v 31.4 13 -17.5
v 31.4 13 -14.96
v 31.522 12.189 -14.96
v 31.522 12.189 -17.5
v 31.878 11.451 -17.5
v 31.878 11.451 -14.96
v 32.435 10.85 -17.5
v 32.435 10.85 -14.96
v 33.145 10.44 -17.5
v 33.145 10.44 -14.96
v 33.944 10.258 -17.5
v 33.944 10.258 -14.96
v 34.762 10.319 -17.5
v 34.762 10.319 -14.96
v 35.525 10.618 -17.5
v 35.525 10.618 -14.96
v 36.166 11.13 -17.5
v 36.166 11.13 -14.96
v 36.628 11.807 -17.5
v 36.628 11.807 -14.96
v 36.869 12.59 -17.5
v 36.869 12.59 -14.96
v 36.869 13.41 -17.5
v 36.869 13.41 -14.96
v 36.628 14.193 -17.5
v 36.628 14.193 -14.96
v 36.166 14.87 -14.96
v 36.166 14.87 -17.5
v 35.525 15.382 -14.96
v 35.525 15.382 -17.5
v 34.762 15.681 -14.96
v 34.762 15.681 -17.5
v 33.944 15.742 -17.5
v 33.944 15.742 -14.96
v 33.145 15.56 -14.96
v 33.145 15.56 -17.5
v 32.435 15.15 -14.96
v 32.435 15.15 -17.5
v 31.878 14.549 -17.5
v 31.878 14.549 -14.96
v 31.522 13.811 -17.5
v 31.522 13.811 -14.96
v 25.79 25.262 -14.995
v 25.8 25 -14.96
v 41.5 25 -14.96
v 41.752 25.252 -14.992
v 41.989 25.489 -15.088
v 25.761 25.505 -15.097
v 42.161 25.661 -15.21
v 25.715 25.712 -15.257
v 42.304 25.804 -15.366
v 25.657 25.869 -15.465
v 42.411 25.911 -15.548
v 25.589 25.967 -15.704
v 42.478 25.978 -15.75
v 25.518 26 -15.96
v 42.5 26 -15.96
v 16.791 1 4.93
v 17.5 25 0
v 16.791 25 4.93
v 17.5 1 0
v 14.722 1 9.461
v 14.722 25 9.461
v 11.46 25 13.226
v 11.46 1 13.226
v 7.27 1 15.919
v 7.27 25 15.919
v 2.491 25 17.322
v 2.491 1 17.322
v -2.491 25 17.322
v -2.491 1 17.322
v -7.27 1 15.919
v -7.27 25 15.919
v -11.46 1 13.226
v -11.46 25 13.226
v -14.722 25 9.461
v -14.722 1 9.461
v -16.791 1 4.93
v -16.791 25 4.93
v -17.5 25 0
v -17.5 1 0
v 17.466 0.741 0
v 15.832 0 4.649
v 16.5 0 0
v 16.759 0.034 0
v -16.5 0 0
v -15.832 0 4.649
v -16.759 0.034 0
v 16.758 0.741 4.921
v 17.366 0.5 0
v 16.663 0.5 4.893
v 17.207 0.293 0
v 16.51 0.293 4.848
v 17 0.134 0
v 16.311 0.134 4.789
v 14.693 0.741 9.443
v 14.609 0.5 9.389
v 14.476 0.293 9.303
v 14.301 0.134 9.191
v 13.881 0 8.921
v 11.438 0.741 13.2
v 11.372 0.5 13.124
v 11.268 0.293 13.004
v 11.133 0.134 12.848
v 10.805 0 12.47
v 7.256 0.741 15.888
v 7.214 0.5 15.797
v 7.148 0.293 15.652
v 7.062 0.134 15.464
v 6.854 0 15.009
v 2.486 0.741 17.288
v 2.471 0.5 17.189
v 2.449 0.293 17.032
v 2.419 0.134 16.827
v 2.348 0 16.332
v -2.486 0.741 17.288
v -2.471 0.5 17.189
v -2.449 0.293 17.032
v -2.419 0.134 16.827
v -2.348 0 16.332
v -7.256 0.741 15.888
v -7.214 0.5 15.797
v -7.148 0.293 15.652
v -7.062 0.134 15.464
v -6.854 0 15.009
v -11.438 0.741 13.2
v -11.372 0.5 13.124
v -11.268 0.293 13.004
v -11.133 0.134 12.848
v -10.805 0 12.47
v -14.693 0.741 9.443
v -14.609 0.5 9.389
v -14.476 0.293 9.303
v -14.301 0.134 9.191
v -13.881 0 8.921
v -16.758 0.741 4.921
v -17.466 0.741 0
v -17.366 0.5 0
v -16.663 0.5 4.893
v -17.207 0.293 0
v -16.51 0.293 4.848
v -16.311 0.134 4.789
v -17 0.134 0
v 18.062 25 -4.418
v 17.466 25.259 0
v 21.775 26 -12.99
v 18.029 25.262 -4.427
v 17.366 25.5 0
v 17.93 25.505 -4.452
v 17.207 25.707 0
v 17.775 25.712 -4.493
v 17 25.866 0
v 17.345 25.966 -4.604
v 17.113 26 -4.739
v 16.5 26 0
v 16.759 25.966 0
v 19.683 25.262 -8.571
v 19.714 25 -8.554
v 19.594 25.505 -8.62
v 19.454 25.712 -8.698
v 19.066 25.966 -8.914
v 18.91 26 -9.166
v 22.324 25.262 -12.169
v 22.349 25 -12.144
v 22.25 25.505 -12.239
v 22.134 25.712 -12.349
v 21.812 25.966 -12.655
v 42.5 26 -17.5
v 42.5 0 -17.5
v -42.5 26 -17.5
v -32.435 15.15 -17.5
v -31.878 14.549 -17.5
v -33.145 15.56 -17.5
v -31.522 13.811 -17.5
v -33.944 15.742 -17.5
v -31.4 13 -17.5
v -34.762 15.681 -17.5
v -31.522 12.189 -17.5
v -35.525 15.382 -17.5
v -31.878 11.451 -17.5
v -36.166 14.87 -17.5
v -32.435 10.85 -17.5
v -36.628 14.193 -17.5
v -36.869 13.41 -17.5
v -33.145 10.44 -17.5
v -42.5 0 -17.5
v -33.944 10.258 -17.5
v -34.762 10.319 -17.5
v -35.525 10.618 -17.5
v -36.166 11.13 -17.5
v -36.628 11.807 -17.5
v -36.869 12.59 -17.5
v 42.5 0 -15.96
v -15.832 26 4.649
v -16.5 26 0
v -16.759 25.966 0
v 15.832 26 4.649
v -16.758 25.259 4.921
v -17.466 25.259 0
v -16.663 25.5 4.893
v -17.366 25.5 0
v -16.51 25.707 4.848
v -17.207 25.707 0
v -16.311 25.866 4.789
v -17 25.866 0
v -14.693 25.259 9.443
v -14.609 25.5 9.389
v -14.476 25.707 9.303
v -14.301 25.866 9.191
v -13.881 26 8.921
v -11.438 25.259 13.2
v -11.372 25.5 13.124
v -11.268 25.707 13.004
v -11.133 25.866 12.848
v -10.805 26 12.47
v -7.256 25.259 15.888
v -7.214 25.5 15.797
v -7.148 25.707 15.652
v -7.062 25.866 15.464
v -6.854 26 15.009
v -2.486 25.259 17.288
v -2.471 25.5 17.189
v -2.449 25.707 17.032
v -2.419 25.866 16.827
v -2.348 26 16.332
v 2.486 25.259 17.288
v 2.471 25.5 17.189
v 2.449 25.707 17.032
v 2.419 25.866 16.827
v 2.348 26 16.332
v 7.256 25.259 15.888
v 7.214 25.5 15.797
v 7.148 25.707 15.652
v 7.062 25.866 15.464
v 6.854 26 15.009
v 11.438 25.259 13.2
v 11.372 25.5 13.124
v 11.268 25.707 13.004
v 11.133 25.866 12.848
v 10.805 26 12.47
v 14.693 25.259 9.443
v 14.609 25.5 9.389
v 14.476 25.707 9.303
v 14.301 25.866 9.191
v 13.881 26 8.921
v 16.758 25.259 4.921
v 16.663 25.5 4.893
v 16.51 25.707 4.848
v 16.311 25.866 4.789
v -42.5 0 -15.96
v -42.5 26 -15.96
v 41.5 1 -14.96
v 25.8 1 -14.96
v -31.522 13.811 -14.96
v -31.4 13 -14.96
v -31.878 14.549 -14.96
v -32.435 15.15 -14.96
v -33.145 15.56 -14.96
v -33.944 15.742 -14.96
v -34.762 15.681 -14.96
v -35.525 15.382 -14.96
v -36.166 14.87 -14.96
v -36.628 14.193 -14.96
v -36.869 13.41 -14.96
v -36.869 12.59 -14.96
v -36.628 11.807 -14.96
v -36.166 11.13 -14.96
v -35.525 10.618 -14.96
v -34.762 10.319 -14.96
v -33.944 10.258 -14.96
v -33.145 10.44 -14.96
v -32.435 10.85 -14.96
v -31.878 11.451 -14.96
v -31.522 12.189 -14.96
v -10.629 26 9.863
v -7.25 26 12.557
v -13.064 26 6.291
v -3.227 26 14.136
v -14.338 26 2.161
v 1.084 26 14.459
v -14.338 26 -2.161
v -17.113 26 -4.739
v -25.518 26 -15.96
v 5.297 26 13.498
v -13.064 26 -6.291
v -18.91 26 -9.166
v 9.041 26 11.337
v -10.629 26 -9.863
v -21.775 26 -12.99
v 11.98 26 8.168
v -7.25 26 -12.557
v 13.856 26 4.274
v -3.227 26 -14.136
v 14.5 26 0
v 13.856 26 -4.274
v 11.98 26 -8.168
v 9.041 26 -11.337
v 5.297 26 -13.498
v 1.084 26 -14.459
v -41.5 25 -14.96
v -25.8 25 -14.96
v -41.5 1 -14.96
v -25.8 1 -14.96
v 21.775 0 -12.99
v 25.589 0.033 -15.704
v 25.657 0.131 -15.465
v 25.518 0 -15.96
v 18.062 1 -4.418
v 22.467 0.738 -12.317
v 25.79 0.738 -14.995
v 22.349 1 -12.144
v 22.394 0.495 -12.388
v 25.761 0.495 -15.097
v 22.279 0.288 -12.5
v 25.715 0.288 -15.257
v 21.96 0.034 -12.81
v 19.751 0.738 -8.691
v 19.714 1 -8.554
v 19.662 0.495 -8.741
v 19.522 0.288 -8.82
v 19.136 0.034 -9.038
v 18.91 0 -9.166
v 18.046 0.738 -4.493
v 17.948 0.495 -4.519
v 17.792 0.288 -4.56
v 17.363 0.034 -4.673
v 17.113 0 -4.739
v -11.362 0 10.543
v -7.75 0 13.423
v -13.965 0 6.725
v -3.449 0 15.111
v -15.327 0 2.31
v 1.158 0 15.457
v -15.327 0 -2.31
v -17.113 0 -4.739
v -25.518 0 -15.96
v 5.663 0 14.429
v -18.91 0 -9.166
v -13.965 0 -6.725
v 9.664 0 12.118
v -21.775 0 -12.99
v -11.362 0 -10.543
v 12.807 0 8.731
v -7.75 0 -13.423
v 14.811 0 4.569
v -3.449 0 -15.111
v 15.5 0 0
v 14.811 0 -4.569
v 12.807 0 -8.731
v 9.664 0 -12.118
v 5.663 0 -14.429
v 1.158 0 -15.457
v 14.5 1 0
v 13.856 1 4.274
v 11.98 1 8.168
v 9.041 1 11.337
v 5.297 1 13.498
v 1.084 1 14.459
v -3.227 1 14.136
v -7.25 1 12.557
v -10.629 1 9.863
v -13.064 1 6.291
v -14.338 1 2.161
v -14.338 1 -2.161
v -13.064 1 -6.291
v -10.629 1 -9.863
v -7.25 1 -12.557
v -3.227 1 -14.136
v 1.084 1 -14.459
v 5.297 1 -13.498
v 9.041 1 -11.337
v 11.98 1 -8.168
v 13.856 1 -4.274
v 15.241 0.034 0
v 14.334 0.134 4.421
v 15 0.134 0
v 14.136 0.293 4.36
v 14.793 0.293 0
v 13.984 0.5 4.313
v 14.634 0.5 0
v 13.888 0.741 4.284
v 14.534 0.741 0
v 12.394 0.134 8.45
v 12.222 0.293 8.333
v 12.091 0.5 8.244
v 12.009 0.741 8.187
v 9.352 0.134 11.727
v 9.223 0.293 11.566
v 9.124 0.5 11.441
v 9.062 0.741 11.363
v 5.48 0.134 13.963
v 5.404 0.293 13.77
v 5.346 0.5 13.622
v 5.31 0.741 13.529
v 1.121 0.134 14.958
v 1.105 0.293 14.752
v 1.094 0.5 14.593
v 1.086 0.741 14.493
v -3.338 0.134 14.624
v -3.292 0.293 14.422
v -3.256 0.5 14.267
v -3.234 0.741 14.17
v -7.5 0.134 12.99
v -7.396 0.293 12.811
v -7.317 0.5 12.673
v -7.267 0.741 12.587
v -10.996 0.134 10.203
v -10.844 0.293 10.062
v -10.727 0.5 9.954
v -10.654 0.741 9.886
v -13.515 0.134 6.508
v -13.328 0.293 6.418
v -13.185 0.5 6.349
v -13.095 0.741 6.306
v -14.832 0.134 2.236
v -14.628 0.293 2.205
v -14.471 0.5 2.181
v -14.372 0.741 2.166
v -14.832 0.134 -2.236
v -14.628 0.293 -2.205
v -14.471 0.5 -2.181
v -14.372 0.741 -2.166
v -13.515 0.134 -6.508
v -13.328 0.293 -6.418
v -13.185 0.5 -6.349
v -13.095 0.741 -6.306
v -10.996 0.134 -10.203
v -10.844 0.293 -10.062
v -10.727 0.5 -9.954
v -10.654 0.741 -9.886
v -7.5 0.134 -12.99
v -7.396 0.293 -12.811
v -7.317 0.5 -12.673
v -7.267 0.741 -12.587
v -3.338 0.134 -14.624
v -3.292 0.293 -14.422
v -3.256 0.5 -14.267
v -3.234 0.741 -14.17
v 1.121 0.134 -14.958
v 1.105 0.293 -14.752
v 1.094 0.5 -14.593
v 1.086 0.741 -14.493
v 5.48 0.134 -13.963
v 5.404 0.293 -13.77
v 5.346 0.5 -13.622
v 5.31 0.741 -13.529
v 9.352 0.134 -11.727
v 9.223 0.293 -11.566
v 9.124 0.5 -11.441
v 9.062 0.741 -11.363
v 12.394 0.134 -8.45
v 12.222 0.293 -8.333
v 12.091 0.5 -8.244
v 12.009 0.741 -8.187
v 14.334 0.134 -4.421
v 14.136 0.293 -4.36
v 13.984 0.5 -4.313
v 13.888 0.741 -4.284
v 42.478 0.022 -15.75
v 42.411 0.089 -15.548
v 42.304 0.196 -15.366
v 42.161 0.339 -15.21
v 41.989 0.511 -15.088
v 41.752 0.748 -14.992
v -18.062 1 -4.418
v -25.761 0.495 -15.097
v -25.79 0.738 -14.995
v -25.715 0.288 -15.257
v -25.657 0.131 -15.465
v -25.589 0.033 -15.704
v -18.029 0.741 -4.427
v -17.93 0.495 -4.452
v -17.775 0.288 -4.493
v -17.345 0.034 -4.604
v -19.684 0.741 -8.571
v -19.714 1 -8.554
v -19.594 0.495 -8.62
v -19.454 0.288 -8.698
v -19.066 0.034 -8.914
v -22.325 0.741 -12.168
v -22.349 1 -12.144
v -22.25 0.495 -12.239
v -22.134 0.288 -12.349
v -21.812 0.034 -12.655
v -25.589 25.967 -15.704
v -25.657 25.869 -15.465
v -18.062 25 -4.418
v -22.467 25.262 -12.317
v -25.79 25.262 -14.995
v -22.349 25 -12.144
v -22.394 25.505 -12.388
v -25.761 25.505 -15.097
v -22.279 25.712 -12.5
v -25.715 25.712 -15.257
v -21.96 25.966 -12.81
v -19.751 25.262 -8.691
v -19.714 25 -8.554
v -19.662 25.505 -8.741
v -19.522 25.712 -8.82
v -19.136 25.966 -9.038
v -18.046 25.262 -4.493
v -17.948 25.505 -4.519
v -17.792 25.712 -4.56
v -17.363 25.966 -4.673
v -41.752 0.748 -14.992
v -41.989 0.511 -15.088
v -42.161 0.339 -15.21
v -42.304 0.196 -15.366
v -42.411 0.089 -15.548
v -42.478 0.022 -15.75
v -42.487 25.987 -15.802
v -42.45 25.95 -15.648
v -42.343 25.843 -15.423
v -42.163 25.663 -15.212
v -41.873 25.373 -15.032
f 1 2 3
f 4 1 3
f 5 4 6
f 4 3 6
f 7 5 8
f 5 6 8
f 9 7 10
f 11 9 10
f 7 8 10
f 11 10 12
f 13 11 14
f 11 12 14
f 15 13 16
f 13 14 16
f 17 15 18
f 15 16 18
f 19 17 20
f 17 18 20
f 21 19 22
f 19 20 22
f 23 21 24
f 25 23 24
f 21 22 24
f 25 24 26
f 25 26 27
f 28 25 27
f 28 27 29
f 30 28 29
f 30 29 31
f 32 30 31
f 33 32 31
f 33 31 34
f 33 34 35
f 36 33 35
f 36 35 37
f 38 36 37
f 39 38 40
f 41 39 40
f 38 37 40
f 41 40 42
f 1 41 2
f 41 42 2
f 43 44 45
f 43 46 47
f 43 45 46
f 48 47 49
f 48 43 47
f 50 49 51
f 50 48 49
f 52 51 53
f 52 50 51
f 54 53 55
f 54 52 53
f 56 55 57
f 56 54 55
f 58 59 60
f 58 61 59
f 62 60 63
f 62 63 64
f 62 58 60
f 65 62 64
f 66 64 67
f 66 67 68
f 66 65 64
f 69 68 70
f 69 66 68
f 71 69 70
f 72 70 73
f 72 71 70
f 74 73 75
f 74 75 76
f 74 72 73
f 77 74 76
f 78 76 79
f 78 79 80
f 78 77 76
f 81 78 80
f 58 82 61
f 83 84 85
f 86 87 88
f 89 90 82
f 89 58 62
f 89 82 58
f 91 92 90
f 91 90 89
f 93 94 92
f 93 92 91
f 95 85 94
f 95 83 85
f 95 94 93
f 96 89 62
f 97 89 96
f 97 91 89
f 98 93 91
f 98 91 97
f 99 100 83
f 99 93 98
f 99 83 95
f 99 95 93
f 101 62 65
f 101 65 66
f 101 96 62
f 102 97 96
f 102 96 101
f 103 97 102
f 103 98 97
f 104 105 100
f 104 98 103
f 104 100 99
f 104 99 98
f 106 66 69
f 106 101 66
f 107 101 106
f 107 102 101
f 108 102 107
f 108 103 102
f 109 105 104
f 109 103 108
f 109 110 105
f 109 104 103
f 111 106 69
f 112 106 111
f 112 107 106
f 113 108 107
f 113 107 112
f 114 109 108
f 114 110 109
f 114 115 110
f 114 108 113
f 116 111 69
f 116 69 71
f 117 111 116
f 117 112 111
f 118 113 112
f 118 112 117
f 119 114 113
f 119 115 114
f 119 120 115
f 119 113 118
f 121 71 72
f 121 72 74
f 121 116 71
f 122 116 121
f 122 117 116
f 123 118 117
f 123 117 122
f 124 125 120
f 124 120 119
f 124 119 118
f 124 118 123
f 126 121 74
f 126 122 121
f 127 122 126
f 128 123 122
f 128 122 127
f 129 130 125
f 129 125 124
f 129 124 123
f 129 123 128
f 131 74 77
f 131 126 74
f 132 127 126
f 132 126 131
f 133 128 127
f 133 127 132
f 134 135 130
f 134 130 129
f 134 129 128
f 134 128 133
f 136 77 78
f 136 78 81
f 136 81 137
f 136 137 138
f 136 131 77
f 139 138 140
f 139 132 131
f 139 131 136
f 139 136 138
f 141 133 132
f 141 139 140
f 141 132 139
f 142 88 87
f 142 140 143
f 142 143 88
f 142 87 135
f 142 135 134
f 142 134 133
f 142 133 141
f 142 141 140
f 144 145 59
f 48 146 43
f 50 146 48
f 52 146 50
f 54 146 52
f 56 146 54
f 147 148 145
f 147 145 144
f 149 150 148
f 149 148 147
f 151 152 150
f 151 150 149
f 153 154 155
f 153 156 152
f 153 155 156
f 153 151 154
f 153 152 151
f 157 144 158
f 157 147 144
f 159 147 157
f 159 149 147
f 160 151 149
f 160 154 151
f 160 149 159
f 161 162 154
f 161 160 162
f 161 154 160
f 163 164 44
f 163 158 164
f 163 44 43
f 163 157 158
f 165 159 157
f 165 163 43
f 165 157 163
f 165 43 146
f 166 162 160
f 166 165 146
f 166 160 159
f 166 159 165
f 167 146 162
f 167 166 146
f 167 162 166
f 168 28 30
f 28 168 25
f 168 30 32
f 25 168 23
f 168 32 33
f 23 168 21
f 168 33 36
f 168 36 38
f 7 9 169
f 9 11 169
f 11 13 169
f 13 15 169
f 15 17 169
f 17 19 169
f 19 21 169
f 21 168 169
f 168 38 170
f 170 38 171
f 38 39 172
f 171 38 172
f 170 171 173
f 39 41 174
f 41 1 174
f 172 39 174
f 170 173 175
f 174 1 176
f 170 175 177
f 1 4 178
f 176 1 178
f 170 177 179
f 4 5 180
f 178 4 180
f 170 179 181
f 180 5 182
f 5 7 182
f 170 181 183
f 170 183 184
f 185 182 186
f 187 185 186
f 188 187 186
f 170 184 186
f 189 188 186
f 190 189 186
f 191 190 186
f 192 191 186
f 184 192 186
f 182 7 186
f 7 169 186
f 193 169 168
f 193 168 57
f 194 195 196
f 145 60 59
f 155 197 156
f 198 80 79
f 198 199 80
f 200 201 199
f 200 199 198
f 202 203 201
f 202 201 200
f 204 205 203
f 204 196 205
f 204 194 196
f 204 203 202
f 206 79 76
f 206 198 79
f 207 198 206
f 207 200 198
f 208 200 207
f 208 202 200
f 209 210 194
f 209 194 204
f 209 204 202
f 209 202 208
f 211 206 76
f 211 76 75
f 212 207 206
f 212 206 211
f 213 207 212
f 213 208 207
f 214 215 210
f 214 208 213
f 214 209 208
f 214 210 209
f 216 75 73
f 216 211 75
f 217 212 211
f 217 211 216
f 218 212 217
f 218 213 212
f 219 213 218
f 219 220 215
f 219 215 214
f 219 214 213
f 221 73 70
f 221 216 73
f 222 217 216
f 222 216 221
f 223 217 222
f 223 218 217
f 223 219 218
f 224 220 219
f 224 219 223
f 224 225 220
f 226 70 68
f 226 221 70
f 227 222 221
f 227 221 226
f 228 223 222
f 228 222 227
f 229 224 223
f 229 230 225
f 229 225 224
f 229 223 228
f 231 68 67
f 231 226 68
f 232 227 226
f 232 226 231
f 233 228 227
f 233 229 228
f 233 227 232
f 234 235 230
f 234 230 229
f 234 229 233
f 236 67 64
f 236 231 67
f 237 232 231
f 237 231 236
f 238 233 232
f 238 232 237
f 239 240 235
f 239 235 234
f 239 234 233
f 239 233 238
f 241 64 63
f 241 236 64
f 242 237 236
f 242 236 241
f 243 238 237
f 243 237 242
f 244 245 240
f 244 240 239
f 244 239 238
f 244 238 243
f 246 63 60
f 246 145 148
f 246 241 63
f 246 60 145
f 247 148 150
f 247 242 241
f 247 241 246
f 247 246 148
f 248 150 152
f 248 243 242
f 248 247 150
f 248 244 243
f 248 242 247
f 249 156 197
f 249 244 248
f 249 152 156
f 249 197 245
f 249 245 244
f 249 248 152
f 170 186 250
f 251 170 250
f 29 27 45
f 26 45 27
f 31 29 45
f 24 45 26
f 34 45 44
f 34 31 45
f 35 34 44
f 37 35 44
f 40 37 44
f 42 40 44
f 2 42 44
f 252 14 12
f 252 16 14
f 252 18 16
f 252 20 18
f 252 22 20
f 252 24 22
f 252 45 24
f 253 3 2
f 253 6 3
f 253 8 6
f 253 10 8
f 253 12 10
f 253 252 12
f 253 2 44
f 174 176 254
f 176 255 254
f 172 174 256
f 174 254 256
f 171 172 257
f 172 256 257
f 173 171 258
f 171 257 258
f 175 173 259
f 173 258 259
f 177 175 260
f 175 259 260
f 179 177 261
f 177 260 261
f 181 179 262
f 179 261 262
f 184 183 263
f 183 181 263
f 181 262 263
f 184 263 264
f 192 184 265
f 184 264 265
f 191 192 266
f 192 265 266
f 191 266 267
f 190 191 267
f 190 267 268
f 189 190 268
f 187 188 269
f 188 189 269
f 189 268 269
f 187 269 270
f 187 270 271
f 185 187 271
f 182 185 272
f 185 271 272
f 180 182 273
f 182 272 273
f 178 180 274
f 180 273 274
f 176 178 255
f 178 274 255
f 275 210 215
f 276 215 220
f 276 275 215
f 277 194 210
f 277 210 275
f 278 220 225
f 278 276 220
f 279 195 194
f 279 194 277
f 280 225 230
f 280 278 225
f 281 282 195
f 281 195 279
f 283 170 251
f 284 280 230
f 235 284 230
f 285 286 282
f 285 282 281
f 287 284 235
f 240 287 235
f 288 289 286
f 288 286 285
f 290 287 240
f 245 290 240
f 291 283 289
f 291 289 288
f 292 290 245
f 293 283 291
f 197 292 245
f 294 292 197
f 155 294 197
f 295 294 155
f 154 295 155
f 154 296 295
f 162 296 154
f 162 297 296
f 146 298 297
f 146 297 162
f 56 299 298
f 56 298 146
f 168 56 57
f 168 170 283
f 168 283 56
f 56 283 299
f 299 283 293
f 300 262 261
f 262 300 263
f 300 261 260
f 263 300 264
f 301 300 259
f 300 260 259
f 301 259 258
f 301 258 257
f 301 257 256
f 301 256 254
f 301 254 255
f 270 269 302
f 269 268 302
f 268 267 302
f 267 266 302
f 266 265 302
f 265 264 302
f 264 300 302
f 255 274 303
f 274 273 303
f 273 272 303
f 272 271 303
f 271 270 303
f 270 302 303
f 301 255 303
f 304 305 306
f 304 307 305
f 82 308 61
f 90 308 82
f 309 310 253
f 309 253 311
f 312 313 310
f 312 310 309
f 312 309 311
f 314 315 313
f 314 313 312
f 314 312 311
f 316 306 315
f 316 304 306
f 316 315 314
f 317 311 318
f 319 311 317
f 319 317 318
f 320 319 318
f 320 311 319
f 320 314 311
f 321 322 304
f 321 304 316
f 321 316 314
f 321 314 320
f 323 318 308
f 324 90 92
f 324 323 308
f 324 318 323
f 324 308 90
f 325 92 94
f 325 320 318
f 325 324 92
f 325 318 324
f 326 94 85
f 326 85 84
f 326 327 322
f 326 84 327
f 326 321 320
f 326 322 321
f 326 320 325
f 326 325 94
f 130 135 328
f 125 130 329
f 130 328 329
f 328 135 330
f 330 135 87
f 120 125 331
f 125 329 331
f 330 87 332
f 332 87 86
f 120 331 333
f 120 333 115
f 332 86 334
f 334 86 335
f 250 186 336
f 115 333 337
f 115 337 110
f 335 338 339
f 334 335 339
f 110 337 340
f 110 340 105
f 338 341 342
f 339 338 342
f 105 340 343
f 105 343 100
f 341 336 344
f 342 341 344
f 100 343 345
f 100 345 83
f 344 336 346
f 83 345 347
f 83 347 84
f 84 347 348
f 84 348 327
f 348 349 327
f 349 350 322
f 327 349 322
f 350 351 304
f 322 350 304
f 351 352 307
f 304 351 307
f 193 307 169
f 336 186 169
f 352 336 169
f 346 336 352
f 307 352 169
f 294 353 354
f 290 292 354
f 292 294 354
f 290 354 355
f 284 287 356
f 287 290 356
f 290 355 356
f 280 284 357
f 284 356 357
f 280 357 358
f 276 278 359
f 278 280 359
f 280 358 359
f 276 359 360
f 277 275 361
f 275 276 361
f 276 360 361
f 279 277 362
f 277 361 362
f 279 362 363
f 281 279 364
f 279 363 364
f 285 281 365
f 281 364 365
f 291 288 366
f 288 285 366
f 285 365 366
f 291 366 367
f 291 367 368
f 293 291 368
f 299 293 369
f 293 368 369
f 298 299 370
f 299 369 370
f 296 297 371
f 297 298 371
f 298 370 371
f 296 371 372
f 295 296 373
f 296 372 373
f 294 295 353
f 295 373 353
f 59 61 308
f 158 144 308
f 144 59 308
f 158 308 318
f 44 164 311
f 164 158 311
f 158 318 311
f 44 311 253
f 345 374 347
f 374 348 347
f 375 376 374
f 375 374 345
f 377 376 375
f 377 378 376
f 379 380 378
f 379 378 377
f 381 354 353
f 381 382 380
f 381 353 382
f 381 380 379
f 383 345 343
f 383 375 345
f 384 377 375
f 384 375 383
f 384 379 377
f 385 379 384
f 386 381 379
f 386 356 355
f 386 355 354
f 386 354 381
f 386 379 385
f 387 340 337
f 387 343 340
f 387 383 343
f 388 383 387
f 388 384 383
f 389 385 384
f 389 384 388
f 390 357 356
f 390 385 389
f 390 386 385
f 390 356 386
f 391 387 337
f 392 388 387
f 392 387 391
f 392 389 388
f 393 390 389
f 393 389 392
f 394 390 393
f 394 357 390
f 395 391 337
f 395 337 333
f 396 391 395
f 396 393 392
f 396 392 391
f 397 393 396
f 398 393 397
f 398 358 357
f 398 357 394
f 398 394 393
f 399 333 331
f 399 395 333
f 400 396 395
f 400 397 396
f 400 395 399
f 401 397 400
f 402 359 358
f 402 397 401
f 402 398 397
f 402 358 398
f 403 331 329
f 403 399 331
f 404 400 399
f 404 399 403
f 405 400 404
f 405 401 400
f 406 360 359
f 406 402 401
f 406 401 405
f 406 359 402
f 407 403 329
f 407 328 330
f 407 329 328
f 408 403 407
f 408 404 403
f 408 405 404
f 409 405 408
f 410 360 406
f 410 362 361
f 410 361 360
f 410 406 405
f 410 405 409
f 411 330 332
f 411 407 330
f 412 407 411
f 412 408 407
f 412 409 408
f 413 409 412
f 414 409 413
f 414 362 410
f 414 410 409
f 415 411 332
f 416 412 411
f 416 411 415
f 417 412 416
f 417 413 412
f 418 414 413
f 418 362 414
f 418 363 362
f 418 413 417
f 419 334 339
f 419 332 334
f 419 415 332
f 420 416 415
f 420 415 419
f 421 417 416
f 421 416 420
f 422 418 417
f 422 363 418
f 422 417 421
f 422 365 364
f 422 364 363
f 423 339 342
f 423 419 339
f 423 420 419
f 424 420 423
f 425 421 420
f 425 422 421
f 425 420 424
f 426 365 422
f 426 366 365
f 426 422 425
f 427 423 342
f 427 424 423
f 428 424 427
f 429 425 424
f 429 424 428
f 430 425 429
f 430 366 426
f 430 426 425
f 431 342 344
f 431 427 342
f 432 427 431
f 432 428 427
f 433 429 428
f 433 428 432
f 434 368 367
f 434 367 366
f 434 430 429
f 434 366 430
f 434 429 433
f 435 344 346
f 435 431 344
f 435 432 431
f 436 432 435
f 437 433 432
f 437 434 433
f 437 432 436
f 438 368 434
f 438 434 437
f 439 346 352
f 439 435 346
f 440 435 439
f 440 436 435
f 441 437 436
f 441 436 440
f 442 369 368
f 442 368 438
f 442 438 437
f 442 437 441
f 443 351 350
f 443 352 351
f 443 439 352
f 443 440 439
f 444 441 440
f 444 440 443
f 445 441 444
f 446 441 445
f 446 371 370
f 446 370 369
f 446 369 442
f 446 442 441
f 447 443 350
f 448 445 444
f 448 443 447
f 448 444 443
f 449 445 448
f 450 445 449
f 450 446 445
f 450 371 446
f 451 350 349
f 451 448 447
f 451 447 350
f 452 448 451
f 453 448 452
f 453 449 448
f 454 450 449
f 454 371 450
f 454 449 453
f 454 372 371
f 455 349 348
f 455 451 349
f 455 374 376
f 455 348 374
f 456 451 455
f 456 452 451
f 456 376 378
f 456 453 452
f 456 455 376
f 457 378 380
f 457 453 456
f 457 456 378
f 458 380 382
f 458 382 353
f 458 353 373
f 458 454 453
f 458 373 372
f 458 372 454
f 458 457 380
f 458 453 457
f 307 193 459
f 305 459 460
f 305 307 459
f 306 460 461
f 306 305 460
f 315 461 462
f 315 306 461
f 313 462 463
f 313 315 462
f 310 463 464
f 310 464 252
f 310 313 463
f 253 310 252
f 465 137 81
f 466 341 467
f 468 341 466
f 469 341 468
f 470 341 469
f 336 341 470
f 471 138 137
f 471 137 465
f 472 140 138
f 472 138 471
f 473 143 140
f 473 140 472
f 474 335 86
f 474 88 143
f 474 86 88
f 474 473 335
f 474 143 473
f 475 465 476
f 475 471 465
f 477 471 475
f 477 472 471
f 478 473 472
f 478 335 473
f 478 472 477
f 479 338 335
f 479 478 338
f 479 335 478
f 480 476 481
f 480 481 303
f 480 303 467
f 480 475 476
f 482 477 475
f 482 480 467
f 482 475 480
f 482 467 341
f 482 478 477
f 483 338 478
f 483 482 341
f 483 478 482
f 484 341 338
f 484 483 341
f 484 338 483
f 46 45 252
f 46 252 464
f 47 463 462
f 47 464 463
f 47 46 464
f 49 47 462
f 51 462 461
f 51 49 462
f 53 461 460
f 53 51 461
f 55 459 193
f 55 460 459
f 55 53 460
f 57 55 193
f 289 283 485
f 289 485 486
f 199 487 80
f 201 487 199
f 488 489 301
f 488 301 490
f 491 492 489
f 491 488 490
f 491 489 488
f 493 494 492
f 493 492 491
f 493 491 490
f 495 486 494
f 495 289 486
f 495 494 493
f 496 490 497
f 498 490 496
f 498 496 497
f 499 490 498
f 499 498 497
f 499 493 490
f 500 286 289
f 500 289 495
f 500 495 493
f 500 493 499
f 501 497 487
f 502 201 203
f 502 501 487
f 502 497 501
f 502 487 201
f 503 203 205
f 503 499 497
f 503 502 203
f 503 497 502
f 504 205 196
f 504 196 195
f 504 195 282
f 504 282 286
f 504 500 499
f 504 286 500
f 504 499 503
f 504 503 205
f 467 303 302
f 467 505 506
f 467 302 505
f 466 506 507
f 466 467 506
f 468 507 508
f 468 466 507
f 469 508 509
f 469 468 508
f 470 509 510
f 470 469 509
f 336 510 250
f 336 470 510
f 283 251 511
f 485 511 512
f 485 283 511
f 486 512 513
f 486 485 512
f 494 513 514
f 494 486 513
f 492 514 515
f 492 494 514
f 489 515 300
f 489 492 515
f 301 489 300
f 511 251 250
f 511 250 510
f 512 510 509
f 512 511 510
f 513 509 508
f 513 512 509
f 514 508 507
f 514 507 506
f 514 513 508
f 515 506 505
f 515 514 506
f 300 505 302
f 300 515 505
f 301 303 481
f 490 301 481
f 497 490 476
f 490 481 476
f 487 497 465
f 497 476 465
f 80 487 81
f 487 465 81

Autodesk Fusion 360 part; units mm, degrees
sketch "Sketch1" plane through (0, 0, 0) normal (0, 1, 0) x (1, 0, 0)
  circle A0 centre (0, 0) radius 14.5
  circle A1 centre (0, 0) radius 17.5
  line L0 (0, 17.5) -> (28.7095, 17.5) construction
  line L1 (17.5, 0) -> (17.5, 17.5) construction
  line L2 (17.5, 0) -> (17.5, 17.5)
  line L3 (0, 17.5) -> (17.5, 17.5)
  line L4 (17.5, 17.5) -> (42.5, 17.5)
  line L5 (42.5, 17.5) -> (42.5, 14.96)
  line L6 (42.5, 14.96) -> (17.5, 14.96)
  line L7 (17.5, 14.96) -> (17.5, 17.5)
  line L8 (17.5, 14.96) -> (18.9859, 14.96) construction
  line L9 (17.5, 14.96) -> (25.8, 14.96) construction
  arc A2 (25.8, 14.96) -> (17.5, 0) centre (35.132, 0) ccw
  line L10 (0, -17.5) -> (0, 17.5) construction
  line L11 (17.5, 0) -> (-17.5, 0) construction
  arc A3 (-17.5, 0) -> (-25.8, 14.96) centre (-35.132, 0) ccw
  line L12 (-17.5, 0) -> (-17.5, 17.5)
  line L13 (-17.5, 14.96) -> (-25.8, 14.96) construction
  line L14 (-42.5, 14.96) -> (-17.5, 14.96)
  line L15 (-42.5, 17.5) -> (-42.5, 14.96)
  line L16 (-17.5, 17.5) -> (-42.5, 17.5)
  line L17 (0, 17.5) -> (-17.5, 17.5)
  dimension "d5" = 29
  dimension "d6" = 35
  dimension "d7" = 25
  dimension "d8" = 2.54
  dimension "d9" = 8.3
extrude "Extrude1" add sketch "Sketch1" along normal blind 26
sketch "Sketch3" plane through (0, 0, -14.96) normal (0, 0, 1) x (-1, 0, 0)
  line L0 (-25.8, 0) -> (-42.5, 0)
  line L1 (-42.5, 0) -> (-42.5, -26)
  line L2 (-42.5, -26) -> (-25.8, -26)
  line L3 (-25.8, -26) -> (-25.8, 0)
  line L4 (-25.8, -26) -> (-42.5, 0) construction
  line L5 (-42.5, -26) -> (-25.8, 0) construction
  circle A0 centre (-34.15, -13) radius 2.75
  dimension "d16" = 5.5
extrude "Extrude2" cut sketch "Sketch3" against normal up to surface (2.54 mm away) contours A0
mirror "Mirror1" about plane through (0, 0, 0) normal (1, 0, 0) of "Extrude2"
fillet "Fillet3" radius 1 13 edges at (-34.15, 0, -14.96) (-42.5, 13, -14.96) (-34.15, 26, -14.96) (-19.714, 0, -8.5541) (0, 0, 17.5) (19.714, 0, -8.5541) (-13.5187, 0, -5.2434) (34.15, 26, -14.96) (-19.714, 26, -8.5541) (0, 26, 17.5) (19.714, 26, -8.5541) (34.15, 0, -14.96) (42.5, 13, -14.96)
equation "InnerDiameter = 29 mm"
equation "OuterDiameter = 35 mm"
equation "Width = 26 mm"
equation "ScrewDiameter = 5.5 mm"
equation "d5 = InnerDiameter"
equation "d6 = OuterDiameter"
equation "d10 = Width"
equation "d16 = ScrewDiameter"
